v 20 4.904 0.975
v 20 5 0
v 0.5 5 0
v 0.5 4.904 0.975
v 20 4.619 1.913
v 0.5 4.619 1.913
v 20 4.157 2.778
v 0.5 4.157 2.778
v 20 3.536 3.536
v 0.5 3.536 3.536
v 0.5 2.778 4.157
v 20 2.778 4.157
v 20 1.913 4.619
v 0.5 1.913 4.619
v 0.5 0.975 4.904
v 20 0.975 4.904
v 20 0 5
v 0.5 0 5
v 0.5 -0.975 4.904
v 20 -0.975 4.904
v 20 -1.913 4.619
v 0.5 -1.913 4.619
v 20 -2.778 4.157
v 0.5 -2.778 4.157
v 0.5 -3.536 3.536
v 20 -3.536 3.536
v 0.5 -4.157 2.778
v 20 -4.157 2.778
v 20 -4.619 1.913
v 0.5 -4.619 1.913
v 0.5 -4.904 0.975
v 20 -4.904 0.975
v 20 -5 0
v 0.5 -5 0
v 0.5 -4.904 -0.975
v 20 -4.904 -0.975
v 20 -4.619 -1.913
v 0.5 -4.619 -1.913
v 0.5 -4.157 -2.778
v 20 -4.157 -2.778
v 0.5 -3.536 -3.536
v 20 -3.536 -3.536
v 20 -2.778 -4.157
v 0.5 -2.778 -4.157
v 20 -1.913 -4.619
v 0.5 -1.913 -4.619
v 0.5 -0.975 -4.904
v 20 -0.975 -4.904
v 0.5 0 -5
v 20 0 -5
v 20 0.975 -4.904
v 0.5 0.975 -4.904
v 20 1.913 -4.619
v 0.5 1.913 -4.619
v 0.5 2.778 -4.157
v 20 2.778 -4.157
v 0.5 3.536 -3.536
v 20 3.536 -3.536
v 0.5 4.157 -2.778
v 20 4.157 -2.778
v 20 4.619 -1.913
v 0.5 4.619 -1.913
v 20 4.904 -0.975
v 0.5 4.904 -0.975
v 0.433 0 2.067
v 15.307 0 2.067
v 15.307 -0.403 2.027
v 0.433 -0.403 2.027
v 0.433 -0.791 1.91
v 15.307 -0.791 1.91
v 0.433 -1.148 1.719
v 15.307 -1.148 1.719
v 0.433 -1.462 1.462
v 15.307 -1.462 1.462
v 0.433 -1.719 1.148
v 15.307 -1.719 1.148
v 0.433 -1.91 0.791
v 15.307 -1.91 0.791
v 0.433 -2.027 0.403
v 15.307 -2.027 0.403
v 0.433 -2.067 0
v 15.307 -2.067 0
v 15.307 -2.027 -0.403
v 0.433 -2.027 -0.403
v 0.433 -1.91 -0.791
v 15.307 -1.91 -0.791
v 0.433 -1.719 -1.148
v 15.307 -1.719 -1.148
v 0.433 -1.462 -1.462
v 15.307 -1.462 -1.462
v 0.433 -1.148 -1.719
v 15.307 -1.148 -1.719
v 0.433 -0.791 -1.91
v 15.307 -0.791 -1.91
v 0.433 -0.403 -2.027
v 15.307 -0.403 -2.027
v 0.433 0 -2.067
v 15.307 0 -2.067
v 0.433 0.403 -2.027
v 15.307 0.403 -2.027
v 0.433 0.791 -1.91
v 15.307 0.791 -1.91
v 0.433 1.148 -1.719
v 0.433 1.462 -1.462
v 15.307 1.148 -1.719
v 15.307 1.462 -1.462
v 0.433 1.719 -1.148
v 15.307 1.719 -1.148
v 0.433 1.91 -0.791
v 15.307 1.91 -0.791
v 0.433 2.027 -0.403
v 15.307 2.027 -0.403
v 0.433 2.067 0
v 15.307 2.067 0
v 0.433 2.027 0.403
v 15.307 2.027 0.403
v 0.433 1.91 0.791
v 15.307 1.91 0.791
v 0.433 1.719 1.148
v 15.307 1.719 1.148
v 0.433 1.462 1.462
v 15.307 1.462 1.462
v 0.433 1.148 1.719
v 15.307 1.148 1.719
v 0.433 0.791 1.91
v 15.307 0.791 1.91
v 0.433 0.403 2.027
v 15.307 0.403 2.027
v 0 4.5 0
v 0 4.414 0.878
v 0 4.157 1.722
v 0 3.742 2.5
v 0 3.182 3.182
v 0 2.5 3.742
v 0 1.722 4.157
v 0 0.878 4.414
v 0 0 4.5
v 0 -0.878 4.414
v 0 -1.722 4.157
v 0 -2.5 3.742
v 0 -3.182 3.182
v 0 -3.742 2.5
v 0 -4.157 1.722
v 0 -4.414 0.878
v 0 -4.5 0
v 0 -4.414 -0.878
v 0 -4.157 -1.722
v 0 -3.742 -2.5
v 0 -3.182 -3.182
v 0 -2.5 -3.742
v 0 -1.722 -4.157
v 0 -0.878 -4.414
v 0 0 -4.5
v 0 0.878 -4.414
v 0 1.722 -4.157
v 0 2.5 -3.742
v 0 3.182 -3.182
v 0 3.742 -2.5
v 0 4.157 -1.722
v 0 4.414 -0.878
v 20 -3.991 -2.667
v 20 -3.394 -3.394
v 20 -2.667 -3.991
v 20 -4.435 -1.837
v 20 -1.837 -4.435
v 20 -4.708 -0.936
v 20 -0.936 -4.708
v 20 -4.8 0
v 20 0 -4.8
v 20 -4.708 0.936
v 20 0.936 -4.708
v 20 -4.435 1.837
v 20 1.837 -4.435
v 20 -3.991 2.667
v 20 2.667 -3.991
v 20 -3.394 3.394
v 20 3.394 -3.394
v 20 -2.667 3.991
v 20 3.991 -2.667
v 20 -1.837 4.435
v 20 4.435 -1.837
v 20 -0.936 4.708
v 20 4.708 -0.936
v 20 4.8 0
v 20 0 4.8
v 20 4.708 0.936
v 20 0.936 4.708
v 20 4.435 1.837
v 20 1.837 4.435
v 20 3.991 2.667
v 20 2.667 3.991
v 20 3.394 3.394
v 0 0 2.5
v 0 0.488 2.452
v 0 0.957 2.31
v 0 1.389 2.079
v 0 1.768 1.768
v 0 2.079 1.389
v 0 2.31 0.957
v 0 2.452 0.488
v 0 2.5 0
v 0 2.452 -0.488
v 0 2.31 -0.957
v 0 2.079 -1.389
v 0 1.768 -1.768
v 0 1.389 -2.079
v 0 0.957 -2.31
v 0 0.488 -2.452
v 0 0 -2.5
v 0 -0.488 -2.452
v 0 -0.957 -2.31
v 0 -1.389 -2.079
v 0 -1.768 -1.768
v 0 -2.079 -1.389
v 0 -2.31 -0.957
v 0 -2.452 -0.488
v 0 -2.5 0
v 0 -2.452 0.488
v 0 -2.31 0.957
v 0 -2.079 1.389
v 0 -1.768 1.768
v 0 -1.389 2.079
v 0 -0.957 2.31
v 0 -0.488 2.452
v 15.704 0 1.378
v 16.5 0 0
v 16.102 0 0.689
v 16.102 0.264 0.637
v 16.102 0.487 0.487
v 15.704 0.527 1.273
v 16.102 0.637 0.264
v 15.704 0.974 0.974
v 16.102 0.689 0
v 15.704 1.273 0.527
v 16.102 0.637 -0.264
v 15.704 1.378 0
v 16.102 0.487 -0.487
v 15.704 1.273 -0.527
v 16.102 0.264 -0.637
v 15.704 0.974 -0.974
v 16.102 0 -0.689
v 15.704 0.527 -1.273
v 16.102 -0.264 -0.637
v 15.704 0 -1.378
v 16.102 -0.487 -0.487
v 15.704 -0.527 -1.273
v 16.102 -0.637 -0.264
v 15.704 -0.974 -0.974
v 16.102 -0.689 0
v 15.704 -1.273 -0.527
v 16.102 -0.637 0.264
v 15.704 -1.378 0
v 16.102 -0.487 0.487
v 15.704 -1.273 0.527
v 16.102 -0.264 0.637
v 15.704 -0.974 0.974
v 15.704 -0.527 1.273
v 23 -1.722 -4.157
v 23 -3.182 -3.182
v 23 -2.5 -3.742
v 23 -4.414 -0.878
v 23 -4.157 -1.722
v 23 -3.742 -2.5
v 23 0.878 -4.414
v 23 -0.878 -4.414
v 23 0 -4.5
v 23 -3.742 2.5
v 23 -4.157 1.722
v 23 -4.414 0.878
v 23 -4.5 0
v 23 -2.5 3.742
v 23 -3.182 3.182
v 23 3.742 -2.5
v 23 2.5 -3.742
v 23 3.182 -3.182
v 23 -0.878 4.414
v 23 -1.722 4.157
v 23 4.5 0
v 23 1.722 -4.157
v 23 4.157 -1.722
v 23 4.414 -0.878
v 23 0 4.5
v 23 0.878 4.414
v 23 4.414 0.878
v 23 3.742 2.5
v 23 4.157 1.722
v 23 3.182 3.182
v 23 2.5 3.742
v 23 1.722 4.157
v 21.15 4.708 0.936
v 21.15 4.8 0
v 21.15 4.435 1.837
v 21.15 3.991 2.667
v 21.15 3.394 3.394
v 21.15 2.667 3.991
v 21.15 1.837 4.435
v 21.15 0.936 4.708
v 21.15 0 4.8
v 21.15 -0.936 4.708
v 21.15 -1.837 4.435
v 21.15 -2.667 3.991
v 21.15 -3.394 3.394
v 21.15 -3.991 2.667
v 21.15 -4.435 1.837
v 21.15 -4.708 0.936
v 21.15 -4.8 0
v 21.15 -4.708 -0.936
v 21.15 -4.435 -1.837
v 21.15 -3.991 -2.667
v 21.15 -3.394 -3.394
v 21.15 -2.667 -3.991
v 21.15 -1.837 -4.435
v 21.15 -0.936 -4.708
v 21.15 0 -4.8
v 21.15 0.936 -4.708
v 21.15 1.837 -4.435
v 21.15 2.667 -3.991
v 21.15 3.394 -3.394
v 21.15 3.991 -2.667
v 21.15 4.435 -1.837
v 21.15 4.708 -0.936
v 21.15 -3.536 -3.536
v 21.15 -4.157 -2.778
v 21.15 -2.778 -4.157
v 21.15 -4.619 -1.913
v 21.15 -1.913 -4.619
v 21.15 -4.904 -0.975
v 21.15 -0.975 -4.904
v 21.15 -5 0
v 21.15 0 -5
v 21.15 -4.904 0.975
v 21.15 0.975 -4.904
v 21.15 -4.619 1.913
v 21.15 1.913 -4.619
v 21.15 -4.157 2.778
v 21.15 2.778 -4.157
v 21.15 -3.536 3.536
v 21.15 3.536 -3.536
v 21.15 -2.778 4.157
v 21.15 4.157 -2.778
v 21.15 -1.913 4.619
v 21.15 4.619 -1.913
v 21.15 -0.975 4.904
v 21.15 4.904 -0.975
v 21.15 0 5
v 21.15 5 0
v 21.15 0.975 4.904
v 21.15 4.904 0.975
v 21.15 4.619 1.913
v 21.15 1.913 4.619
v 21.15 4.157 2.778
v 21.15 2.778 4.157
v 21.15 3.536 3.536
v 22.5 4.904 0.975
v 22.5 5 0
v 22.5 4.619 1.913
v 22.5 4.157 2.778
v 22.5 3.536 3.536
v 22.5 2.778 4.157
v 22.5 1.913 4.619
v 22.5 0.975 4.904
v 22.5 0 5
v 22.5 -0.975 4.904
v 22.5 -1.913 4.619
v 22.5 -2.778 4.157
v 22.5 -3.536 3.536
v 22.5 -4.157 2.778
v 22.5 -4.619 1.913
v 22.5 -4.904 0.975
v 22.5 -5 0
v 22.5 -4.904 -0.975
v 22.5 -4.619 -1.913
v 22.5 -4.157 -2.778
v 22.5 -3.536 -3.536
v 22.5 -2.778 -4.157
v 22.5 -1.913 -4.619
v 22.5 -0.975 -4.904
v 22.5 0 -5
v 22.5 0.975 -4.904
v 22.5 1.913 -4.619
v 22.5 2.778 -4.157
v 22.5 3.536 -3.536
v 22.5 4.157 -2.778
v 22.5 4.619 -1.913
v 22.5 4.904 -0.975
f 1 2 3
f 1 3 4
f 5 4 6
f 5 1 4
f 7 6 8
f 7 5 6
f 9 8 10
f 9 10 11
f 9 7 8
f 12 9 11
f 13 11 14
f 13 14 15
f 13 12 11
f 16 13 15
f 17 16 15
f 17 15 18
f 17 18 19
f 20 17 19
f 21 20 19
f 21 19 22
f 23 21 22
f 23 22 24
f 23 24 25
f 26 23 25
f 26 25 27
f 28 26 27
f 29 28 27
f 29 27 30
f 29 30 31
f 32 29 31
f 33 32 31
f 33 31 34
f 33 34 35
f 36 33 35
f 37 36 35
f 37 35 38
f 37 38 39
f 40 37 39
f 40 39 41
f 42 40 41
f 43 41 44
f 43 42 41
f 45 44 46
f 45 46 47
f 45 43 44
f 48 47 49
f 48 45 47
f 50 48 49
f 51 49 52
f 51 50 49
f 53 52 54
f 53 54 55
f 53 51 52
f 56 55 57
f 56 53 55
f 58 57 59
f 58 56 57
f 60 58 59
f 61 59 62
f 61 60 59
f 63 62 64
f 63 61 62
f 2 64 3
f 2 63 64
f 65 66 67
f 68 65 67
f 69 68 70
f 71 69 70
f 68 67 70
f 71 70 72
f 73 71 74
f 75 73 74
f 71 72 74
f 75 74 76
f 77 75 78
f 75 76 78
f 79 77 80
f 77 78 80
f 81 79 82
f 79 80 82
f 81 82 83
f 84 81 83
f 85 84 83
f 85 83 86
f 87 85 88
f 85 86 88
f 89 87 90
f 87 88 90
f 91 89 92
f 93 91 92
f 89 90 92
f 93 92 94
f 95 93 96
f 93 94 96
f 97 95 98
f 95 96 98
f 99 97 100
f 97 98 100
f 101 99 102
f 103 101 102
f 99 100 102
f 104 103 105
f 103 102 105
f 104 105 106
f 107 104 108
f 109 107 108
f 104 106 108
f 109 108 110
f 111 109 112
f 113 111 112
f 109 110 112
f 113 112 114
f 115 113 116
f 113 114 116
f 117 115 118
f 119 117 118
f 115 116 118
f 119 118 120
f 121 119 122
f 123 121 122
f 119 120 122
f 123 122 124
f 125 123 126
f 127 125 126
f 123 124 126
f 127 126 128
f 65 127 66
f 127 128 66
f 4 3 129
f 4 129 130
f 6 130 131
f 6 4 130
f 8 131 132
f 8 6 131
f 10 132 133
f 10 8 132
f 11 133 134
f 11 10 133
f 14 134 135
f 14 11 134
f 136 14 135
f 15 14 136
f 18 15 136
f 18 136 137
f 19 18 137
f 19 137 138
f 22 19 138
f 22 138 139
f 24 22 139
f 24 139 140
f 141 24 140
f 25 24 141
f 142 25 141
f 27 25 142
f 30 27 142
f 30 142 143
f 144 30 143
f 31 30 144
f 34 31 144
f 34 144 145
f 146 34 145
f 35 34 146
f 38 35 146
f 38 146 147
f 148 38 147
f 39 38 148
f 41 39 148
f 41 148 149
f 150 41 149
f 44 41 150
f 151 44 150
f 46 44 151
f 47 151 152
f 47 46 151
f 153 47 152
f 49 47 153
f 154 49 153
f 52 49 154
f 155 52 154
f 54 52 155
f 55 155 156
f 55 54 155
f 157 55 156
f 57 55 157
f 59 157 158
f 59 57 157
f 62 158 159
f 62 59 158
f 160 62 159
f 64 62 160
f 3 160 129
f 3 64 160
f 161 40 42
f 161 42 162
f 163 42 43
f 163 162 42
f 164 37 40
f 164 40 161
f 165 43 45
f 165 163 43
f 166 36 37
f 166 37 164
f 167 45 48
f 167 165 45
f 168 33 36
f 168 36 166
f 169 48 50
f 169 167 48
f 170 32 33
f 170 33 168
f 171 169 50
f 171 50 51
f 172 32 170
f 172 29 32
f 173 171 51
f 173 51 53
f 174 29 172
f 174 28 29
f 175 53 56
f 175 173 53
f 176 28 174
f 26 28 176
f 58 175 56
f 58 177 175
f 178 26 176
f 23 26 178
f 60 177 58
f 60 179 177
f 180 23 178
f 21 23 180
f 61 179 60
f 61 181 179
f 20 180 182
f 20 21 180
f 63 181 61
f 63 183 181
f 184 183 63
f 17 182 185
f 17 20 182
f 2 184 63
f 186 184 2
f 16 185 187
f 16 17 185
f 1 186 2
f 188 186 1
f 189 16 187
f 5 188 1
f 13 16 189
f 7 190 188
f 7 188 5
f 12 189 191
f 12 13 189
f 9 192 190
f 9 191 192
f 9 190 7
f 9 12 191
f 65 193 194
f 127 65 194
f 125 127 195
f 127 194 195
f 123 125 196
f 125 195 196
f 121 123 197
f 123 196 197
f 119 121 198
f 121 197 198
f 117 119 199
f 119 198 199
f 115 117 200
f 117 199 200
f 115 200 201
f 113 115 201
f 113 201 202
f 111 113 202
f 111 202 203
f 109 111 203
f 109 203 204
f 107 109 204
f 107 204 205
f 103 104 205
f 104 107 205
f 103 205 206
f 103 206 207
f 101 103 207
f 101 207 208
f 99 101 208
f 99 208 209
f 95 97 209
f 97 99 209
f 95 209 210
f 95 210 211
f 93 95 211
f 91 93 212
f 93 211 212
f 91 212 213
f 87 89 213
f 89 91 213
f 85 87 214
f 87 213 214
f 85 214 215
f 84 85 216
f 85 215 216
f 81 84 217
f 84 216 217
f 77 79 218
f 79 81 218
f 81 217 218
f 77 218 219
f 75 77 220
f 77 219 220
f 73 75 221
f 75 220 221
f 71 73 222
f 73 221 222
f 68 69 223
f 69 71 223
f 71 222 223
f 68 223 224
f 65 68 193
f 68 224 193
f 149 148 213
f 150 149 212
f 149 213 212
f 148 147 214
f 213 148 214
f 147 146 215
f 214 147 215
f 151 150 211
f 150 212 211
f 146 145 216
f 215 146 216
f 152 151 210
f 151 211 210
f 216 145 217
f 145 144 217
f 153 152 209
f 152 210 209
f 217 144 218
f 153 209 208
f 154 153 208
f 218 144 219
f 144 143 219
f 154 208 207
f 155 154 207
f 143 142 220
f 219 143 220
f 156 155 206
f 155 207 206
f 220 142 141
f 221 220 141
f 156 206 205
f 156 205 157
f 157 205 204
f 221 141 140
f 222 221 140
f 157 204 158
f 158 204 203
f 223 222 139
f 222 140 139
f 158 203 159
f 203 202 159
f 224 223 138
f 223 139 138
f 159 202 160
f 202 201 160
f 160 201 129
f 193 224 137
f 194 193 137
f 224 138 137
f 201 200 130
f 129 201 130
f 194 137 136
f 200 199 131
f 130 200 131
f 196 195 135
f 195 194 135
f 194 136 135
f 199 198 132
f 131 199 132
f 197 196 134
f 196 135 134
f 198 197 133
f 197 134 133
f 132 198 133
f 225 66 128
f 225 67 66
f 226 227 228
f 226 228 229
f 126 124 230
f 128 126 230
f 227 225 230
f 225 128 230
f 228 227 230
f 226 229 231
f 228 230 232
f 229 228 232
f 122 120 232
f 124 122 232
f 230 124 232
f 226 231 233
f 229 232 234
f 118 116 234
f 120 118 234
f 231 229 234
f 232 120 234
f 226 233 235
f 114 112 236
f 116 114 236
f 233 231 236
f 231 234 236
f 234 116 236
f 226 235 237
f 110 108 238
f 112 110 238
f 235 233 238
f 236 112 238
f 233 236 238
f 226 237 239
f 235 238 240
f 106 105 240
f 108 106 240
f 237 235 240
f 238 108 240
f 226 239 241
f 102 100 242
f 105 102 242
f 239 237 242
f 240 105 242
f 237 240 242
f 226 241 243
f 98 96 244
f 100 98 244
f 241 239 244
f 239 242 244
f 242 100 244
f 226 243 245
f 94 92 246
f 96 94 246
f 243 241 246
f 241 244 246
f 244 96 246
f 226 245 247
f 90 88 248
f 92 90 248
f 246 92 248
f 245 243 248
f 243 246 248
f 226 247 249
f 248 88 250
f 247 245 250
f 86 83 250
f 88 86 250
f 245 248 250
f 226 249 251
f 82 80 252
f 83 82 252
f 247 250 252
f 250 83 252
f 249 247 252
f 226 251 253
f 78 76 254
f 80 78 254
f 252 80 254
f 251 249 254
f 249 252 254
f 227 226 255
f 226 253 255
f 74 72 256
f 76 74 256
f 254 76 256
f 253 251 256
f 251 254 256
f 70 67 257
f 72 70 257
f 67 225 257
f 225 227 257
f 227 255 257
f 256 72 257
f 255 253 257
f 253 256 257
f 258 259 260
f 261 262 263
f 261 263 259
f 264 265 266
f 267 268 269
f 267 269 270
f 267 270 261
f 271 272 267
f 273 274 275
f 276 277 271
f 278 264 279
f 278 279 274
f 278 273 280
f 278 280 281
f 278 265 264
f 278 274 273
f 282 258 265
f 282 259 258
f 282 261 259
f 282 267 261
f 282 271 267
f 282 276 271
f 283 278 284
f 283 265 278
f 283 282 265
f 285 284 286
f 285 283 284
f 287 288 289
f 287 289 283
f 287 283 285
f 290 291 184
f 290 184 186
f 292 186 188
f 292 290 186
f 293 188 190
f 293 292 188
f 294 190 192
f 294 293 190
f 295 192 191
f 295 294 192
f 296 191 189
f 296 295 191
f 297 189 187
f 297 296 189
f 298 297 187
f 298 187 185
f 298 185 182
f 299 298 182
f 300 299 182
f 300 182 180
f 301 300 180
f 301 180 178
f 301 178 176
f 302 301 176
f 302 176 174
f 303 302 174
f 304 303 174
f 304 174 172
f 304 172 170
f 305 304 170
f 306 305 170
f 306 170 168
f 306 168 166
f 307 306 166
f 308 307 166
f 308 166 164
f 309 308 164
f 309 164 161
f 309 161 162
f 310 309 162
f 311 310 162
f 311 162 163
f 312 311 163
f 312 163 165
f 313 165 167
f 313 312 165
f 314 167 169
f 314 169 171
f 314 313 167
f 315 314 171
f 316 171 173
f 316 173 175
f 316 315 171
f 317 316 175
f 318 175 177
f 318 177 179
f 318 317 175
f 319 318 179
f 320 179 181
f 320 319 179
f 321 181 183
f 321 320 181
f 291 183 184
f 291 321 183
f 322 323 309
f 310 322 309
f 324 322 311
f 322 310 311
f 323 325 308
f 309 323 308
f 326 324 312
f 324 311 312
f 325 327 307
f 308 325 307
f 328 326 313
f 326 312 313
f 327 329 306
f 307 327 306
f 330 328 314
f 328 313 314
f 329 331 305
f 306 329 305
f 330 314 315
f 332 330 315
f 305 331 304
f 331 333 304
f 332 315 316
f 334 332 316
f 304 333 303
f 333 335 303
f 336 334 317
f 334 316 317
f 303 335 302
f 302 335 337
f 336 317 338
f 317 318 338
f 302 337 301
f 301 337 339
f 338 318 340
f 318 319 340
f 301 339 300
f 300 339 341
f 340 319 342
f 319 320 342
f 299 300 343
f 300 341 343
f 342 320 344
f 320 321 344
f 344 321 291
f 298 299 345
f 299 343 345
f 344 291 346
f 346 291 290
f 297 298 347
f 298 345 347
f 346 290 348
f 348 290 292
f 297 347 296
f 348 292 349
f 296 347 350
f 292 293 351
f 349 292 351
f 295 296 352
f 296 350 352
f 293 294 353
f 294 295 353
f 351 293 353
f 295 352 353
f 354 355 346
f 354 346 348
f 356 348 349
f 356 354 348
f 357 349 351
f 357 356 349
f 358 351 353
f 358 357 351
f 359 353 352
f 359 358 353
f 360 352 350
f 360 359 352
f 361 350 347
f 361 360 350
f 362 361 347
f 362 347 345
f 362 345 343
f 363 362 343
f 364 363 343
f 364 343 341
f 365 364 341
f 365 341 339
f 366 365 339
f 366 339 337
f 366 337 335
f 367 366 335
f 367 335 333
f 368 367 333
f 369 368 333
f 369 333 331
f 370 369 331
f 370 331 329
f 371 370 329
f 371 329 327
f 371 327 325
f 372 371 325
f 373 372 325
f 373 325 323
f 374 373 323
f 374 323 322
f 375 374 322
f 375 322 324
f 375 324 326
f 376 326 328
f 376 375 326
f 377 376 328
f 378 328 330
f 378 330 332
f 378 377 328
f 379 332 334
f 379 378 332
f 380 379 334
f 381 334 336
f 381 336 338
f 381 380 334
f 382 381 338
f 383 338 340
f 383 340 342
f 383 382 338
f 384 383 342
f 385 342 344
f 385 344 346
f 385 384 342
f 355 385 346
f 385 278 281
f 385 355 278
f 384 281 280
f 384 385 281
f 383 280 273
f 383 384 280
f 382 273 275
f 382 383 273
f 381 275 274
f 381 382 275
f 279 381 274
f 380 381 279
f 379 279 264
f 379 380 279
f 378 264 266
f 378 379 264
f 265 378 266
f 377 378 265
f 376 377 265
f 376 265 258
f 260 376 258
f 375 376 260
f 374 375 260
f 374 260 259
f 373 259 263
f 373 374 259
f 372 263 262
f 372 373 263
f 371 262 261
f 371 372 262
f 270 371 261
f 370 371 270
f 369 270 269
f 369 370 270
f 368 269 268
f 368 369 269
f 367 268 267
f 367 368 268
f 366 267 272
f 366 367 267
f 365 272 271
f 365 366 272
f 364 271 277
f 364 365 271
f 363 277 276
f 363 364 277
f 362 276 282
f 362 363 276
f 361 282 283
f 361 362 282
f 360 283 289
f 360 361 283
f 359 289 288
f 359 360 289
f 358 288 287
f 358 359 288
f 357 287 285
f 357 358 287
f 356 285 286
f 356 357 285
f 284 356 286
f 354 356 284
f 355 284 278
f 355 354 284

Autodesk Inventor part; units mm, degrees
ref_plane "YZ Plane" through (0, 0, 0) normal (1, 0, 0) x (0, 1, 0)
ref_plane "XZ Plane" through (0, 0, 0) normal (0, 1, 0) x (-1, 0, 0)
ref_plane "XY Plane" through (0, 0, 0) normal (0, 0, 1) x (1, 0, 0)
sketch "Sketch_1" plane through (0, 0, 0) normal (0, 0, 1) x (1, 0, 0)
  line L0 (23, 0) -> (0, 0)
  line L1 (0, 0) -> (0, 4.5)
  line L2 (0, 4.5) -> (0.5, 5)
  line L3 (0.5, 5) -> (22.5, 5)
  line L4 (22.5, 5) -> (23, 4.5)
  line L5 (23, 4.5) -> (23, 0)
  line L6 (23, 0) -> (0, 0)
revolve "Revolution1" add sketch "Sketch_1" angle 360 about axis through (23, 0, 0) along (1, 0, 0)
sketch "Sketch2" plane through (0, 0, 0) normal (-1, 0, 0) x (0, 0, 1)
  point P0 (0, 0)
hole "Hole1" at (0, 0, 0) direction (1, 0, 0) diameter 4.134 depth 15.3066 tip angle 120 countersink diameter 5 countersink angle 90 thread size "M5x0.8" class "6H" standard "ISO Metric profile"
sketch "Sketch_8" plane through (0, 0, 0) normal (0, 0, 1) x (1, 0, 0)
  line L0 (23, 0) -> (-23, 0)
  line L1 (20, 14.8) -> (20, 4.8)
  line L2 (20, 4.8) -> (21.15, 4.8)
  line L3 (21.15, 4.8) -> (21.15, 14.8)
  line L4 (21.15, 14.8) -> (20, 14.8)
revolve "Revolution2" cut sketch "Sketch_8" angle 360 about axis through (23, 0, 0) along (1, 0, 0)
properties part number "FSSFJBF-D10-L20-M5-U3"
